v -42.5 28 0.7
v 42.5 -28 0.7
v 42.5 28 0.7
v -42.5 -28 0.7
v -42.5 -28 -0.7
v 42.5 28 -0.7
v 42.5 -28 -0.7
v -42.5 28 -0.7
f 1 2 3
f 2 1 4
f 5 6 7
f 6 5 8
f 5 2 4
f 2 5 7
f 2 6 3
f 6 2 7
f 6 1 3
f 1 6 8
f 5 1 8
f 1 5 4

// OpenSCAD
// Parameters
pcb_length = 85.0; //[42.5:170.0:0.1]
pcb_width = 56.0; //[28.0:112.0:0.1]
pcb_thickness = 1.4; //[0.7:2.8:0.1]

// PCB Main Body
module pcb_main_body() {
  color([0.0, 0.4, 0.2]) // Green color for PCB
  translate([0, 0, 0])
    cube([pcb_length, pcb_width, pcb_thickness], center=true);
}

// Complete PCB Model
module pcb_complete_model() {
  union() {
    pcb_main_body();
  }
}

// Render the final output
pcb_complete_model();
